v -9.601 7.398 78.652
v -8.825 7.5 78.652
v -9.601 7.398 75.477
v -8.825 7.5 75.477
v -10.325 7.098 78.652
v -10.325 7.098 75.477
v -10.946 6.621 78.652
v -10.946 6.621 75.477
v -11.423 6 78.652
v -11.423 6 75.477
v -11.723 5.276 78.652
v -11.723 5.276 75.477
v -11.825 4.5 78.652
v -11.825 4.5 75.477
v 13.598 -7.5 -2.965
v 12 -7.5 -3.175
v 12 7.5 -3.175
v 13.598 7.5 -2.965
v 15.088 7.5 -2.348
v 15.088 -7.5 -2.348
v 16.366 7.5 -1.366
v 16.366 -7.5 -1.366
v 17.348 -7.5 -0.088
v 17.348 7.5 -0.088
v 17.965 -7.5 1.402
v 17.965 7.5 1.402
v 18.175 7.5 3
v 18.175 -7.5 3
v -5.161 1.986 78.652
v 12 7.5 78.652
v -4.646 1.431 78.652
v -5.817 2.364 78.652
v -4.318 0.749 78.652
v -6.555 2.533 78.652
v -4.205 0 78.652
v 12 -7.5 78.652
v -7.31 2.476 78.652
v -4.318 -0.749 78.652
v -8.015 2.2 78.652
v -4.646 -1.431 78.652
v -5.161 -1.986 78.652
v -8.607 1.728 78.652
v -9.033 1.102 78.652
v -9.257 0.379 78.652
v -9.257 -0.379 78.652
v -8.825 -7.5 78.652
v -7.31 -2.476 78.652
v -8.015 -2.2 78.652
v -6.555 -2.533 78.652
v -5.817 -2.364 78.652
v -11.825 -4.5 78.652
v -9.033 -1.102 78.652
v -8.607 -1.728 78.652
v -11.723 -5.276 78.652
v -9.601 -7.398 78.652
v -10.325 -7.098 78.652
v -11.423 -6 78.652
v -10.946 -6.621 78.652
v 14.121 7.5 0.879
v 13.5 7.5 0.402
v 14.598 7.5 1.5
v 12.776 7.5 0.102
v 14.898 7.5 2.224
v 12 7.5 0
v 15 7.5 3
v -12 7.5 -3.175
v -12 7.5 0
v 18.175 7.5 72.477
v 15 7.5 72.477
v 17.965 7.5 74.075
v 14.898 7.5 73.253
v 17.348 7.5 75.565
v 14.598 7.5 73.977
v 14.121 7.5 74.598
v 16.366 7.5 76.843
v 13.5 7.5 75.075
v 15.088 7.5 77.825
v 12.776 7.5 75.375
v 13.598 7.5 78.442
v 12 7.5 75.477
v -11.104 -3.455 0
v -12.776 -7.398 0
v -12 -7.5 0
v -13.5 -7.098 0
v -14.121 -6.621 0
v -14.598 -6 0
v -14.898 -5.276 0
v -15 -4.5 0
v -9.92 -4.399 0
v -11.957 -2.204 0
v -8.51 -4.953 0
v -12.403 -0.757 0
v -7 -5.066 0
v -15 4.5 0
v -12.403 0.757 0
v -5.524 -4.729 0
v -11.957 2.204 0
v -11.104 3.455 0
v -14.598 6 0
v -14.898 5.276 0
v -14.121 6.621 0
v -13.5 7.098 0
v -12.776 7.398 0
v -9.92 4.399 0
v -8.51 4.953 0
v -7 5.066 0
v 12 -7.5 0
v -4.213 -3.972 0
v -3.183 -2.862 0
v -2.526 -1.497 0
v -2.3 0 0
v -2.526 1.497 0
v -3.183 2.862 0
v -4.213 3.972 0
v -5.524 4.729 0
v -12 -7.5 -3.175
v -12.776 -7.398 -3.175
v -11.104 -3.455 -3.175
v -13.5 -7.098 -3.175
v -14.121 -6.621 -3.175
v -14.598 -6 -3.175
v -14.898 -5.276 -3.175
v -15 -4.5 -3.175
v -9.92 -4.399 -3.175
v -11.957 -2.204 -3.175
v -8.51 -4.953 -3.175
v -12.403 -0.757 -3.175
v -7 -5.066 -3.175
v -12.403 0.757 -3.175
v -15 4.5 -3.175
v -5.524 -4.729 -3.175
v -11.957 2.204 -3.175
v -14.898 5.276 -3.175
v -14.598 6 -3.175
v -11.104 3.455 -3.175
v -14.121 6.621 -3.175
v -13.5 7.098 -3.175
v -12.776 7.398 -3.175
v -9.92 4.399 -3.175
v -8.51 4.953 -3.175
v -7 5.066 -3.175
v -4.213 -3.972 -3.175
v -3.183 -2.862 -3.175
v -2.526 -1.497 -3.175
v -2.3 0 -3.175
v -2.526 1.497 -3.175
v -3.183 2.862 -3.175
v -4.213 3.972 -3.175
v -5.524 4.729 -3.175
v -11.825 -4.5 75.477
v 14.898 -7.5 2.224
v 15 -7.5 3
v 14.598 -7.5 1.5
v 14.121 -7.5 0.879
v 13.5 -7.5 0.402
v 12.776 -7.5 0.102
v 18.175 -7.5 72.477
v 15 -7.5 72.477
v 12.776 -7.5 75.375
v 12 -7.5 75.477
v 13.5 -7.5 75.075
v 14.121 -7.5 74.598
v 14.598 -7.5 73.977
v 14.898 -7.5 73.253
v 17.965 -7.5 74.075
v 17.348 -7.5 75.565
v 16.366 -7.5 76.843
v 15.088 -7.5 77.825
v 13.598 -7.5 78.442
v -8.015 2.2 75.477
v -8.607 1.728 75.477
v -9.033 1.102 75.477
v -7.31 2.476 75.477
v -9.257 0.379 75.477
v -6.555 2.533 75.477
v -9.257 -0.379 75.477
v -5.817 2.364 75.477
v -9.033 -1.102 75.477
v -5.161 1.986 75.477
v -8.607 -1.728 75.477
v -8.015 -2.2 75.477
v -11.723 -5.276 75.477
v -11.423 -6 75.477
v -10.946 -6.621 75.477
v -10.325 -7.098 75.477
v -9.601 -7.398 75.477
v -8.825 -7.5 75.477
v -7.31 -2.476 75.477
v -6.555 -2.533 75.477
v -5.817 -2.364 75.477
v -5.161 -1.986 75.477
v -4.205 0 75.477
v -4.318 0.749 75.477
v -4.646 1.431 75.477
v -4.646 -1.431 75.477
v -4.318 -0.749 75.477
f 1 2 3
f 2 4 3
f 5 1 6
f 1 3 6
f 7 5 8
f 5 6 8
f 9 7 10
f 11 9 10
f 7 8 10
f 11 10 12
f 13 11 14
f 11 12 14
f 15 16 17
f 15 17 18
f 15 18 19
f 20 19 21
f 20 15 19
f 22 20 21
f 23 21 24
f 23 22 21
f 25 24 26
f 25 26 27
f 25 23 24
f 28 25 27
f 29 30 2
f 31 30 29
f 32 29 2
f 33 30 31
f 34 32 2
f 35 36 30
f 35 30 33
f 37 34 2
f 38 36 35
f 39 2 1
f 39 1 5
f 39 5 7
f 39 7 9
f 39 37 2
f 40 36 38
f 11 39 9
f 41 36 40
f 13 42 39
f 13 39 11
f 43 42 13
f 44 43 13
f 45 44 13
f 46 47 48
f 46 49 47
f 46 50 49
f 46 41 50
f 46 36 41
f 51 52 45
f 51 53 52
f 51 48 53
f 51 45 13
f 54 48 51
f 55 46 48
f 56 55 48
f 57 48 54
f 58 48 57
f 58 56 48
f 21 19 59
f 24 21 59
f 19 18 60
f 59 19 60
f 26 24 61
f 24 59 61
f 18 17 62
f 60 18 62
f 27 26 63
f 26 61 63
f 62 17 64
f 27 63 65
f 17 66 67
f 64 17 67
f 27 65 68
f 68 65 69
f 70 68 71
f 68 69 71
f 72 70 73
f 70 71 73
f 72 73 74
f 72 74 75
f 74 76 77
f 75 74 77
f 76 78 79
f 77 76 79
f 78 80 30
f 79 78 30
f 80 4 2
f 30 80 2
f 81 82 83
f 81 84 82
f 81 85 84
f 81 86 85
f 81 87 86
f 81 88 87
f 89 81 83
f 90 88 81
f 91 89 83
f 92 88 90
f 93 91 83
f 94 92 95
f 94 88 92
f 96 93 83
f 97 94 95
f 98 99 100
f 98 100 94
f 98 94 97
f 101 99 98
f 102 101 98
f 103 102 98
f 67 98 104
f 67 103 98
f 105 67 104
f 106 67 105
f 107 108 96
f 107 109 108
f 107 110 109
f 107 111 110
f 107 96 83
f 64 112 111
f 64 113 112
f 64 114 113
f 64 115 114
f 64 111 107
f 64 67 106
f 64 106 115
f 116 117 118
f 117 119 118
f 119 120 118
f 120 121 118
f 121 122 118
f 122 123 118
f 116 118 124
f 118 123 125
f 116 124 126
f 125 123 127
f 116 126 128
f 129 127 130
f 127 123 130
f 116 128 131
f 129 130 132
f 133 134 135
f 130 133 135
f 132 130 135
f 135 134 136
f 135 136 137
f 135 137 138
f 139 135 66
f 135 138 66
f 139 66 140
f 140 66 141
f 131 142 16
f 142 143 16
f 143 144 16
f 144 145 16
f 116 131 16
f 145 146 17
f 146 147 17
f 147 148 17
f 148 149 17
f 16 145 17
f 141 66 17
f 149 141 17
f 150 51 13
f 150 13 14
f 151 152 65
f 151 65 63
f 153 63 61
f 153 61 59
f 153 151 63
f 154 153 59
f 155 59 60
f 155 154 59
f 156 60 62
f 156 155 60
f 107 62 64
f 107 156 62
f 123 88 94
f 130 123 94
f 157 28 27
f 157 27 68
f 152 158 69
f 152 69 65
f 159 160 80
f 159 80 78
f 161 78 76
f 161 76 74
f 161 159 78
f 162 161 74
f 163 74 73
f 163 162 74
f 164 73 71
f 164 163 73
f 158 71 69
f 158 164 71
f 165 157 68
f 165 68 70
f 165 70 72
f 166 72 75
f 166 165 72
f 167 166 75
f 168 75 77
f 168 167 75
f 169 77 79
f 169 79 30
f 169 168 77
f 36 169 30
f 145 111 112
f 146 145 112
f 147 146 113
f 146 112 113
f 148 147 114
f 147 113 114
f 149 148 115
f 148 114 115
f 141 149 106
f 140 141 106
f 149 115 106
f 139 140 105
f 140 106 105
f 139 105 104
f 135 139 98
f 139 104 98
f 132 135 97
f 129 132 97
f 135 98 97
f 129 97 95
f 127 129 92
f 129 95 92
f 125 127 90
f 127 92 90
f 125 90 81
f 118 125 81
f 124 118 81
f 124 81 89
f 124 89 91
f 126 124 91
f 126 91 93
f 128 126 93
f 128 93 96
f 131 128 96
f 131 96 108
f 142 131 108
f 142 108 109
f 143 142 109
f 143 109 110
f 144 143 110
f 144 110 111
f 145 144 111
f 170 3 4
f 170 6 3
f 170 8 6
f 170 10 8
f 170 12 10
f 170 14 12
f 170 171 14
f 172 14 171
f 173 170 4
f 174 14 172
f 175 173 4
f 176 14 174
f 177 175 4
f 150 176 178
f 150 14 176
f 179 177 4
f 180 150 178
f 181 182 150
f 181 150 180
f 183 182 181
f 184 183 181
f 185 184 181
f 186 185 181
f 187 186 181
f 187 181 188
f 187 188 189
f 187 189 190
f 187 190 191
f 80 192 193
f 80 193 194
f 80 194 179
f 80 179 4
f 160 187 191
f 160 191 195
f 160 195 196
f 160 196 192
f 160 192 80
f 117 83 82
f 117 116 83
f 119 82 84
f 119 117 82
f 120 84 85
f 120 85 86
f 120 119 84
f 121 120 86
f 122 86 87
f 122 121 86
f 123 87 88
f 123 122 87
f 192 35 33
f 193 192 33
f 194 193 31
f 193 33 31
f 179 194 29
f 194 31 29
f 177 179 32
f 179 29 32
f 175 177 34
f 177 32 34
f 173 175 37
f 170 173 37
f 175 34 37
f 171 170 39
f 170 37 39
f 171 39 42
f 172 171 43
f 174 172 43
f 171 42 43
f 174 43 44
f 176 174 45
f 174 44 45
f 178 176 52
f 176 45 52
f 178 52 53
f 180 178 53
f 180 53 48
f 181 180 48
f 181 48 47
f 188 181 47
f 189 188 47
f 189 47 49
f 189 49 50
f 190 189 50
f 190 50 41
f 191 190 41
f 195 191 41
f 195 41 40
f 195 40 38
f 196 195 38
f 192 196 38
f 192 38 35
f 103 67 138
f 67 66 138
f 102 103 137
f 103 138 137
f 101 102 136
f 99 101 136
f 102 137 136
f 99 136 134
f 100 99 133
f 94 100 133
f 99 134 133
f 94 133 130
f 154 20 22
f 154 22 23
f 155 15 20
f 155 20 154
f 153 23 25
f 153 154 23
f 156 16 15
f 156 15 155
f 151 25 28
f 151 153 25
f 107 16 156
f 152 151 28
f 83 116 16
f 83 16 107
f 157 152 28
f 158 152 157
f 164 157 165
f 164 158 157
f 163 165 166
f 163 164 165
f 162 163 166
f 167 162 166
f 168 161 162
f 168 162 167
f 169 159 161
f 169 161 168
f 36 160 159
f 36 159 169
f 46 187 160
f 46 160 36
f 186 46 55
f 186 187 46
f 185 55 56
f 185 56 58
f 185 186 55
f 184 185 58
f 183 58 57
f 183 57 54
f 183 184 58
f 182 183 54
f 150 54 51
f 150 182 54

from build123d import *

# Parameters (mm, degrees)
SKETCH1_W                    = 30
SKETCH1_H                    = 15
BASE_FLANGE1_DEPTH           = 3.175
EDGE_FLANGE1_STRIP_W         = 18.7
EDGE_FLANGE1_STRIP_H         = 3.175
EDGE_FLANGE1_STRIP_CUT_DEPTH = 15
EDGE_FLANGE1_DEPTH           = 15
EDGE_FLANGE2_STRIP_W         = 18.7
EDGE_FLANGE2_STRIP_H         = 3.175
EDGE_FLANGE2_STRIP_CUT_DEPTH = 15
EDGE_FLANGE2_DEPTH           = 15
SKETCH14_R                   = 5.08
CUT_EXTRUDE1_DEPTH           = 82.072299394
SKETCH15_R                   = 2.54
CUT_EXTRUDE2_DEPTH           = 10
FILLET1_R                    = 3


# Sheet-metal steps are written as plain solids
with BuildPart() as part:
    # Sketch1 → Base-Flange1 (new body)
    with BuildSketch(Plane.XY):
        Rectangle(SKETCH1_W, SKETCH1_H)
    extrude(amount=-BASE_FLANGE1_DEPTH)

    # Edge-Flange1 strip (across the edge) → Edge-Flange1 strip cut (cut)
    with BuildSketch(Plane(origin=(15, -7.5, 0), x_dir=(-1, 0, 0), z_dir=(0, 1, 0))):
        with Locations((-6.35, -1.5875)):
            Rectangle(EDGE_FLANGE1_STRIP_W, EDGE_FLANGE1_STRIP_H)
    extrude(amount=EDGE_FLANGE1_STRIP_CUT_DEPTH, mode=Mode.SUBTRACT)

    # Edge-Flange1 section (across the edge) → Edge-Flange1 (add)
    with BuildSketch(Plane(origin=(15, -7.5, 0), x_dir=(-1, 0, 0), z_dir=(0, 1, 0))):
        with BuildLine():
            Line((-3.175, 3), (-3.175, 75.477))
            Line((-3.175, 75.477), (0, 75.477))
            Line((0, 75.477), (0, 3))
            ThreePointArc((0, 3), (0.878679656, 0.878679656), (3, 0))
            Line((3, 0), (3, -3.175))
            ThreePointArc((3, -3.175), (-1.366384374, -1.366384374), (-3.175, 3))
        make_face()
    extrude(amount=EDGE_FLANGE1_DEPTH)

    # Edge-Flange2 strip (across the edge) → Edge-Flange2 strip cut (cut)
    with BuildSketch(Plane(origin=(15, -7.5, 75.477), x_dir=(0, 0, -1), z_dir=(0, 1, 0))):
        with Locations((-6.35, -1.5875)):
            Rectangle(EDGE_FLANGE2_STRIP_W, EDGE_FLANGE2_STRIP_H)
    extrude(amount=EDGE_FLANGE2_STRIP_CUT_DEPTH, mode=Mode.SUBTRACT)

    # Edge-Flange2 section (across the edge) → Edge-Flange2 (add)
    with BuildSketch(Plane(origin=(15, -7.5, 75.477), x_dir=(0, 0, -1), z_dir=(0, 1, 0))):
        with BuildLine():
            Line((-3.175, 3), (-3.175, 26.825))
            Line((-3.175, 26.825), (0, 26.825))
            Line((0, 26.825), (0, 3))
            ThreePointArc((0, 3), (0.878679656, 0.878679656), (3, 0))
            Line((3, 0), (3, -3.175))
            ThreePointArc((3, -3.175), (-1.366384374, -1.366384374), (-3.175, 3))
        make_face()
    extrude(amount=EDGE_FLANGE2_DEPTH)

    # Sketch14 → Cut-Extrude1 (cut, through all)
    with BuildSketch(Plane.XY):
        with Locations((-7.38, 0)):
            Circle(SKETCH14_R)
    extrude(amount=-CUT_EXTRUDE1_DEPTH, mode=Mode.SUBTRACT)

    # Sketch15 → Cut-Extrude2 (cut)
    with BuildSketch(Plane.XY.offset(78.652)):
        with Locations((-6.745, 0)):
            Circle(SKETCH15_R)
    extrude(amount=-CUT_EXTRUDE2_DEPTH, mode=Mode.SUBTRACT)

    # Fillet1
    fillet1_edges = [part.edges().sort_by_distance(p)[0] for p in [
        (-11.825, -7.5, 77.0645),
        (-11.825, 7.5, 77.0645),
        (-15, -7.5, -1.5875),
        (-15, 7.5, -1.5875),
    ]]
    fillet(fillet1_edges, radius=FILLET1_R)


solid = part.part
